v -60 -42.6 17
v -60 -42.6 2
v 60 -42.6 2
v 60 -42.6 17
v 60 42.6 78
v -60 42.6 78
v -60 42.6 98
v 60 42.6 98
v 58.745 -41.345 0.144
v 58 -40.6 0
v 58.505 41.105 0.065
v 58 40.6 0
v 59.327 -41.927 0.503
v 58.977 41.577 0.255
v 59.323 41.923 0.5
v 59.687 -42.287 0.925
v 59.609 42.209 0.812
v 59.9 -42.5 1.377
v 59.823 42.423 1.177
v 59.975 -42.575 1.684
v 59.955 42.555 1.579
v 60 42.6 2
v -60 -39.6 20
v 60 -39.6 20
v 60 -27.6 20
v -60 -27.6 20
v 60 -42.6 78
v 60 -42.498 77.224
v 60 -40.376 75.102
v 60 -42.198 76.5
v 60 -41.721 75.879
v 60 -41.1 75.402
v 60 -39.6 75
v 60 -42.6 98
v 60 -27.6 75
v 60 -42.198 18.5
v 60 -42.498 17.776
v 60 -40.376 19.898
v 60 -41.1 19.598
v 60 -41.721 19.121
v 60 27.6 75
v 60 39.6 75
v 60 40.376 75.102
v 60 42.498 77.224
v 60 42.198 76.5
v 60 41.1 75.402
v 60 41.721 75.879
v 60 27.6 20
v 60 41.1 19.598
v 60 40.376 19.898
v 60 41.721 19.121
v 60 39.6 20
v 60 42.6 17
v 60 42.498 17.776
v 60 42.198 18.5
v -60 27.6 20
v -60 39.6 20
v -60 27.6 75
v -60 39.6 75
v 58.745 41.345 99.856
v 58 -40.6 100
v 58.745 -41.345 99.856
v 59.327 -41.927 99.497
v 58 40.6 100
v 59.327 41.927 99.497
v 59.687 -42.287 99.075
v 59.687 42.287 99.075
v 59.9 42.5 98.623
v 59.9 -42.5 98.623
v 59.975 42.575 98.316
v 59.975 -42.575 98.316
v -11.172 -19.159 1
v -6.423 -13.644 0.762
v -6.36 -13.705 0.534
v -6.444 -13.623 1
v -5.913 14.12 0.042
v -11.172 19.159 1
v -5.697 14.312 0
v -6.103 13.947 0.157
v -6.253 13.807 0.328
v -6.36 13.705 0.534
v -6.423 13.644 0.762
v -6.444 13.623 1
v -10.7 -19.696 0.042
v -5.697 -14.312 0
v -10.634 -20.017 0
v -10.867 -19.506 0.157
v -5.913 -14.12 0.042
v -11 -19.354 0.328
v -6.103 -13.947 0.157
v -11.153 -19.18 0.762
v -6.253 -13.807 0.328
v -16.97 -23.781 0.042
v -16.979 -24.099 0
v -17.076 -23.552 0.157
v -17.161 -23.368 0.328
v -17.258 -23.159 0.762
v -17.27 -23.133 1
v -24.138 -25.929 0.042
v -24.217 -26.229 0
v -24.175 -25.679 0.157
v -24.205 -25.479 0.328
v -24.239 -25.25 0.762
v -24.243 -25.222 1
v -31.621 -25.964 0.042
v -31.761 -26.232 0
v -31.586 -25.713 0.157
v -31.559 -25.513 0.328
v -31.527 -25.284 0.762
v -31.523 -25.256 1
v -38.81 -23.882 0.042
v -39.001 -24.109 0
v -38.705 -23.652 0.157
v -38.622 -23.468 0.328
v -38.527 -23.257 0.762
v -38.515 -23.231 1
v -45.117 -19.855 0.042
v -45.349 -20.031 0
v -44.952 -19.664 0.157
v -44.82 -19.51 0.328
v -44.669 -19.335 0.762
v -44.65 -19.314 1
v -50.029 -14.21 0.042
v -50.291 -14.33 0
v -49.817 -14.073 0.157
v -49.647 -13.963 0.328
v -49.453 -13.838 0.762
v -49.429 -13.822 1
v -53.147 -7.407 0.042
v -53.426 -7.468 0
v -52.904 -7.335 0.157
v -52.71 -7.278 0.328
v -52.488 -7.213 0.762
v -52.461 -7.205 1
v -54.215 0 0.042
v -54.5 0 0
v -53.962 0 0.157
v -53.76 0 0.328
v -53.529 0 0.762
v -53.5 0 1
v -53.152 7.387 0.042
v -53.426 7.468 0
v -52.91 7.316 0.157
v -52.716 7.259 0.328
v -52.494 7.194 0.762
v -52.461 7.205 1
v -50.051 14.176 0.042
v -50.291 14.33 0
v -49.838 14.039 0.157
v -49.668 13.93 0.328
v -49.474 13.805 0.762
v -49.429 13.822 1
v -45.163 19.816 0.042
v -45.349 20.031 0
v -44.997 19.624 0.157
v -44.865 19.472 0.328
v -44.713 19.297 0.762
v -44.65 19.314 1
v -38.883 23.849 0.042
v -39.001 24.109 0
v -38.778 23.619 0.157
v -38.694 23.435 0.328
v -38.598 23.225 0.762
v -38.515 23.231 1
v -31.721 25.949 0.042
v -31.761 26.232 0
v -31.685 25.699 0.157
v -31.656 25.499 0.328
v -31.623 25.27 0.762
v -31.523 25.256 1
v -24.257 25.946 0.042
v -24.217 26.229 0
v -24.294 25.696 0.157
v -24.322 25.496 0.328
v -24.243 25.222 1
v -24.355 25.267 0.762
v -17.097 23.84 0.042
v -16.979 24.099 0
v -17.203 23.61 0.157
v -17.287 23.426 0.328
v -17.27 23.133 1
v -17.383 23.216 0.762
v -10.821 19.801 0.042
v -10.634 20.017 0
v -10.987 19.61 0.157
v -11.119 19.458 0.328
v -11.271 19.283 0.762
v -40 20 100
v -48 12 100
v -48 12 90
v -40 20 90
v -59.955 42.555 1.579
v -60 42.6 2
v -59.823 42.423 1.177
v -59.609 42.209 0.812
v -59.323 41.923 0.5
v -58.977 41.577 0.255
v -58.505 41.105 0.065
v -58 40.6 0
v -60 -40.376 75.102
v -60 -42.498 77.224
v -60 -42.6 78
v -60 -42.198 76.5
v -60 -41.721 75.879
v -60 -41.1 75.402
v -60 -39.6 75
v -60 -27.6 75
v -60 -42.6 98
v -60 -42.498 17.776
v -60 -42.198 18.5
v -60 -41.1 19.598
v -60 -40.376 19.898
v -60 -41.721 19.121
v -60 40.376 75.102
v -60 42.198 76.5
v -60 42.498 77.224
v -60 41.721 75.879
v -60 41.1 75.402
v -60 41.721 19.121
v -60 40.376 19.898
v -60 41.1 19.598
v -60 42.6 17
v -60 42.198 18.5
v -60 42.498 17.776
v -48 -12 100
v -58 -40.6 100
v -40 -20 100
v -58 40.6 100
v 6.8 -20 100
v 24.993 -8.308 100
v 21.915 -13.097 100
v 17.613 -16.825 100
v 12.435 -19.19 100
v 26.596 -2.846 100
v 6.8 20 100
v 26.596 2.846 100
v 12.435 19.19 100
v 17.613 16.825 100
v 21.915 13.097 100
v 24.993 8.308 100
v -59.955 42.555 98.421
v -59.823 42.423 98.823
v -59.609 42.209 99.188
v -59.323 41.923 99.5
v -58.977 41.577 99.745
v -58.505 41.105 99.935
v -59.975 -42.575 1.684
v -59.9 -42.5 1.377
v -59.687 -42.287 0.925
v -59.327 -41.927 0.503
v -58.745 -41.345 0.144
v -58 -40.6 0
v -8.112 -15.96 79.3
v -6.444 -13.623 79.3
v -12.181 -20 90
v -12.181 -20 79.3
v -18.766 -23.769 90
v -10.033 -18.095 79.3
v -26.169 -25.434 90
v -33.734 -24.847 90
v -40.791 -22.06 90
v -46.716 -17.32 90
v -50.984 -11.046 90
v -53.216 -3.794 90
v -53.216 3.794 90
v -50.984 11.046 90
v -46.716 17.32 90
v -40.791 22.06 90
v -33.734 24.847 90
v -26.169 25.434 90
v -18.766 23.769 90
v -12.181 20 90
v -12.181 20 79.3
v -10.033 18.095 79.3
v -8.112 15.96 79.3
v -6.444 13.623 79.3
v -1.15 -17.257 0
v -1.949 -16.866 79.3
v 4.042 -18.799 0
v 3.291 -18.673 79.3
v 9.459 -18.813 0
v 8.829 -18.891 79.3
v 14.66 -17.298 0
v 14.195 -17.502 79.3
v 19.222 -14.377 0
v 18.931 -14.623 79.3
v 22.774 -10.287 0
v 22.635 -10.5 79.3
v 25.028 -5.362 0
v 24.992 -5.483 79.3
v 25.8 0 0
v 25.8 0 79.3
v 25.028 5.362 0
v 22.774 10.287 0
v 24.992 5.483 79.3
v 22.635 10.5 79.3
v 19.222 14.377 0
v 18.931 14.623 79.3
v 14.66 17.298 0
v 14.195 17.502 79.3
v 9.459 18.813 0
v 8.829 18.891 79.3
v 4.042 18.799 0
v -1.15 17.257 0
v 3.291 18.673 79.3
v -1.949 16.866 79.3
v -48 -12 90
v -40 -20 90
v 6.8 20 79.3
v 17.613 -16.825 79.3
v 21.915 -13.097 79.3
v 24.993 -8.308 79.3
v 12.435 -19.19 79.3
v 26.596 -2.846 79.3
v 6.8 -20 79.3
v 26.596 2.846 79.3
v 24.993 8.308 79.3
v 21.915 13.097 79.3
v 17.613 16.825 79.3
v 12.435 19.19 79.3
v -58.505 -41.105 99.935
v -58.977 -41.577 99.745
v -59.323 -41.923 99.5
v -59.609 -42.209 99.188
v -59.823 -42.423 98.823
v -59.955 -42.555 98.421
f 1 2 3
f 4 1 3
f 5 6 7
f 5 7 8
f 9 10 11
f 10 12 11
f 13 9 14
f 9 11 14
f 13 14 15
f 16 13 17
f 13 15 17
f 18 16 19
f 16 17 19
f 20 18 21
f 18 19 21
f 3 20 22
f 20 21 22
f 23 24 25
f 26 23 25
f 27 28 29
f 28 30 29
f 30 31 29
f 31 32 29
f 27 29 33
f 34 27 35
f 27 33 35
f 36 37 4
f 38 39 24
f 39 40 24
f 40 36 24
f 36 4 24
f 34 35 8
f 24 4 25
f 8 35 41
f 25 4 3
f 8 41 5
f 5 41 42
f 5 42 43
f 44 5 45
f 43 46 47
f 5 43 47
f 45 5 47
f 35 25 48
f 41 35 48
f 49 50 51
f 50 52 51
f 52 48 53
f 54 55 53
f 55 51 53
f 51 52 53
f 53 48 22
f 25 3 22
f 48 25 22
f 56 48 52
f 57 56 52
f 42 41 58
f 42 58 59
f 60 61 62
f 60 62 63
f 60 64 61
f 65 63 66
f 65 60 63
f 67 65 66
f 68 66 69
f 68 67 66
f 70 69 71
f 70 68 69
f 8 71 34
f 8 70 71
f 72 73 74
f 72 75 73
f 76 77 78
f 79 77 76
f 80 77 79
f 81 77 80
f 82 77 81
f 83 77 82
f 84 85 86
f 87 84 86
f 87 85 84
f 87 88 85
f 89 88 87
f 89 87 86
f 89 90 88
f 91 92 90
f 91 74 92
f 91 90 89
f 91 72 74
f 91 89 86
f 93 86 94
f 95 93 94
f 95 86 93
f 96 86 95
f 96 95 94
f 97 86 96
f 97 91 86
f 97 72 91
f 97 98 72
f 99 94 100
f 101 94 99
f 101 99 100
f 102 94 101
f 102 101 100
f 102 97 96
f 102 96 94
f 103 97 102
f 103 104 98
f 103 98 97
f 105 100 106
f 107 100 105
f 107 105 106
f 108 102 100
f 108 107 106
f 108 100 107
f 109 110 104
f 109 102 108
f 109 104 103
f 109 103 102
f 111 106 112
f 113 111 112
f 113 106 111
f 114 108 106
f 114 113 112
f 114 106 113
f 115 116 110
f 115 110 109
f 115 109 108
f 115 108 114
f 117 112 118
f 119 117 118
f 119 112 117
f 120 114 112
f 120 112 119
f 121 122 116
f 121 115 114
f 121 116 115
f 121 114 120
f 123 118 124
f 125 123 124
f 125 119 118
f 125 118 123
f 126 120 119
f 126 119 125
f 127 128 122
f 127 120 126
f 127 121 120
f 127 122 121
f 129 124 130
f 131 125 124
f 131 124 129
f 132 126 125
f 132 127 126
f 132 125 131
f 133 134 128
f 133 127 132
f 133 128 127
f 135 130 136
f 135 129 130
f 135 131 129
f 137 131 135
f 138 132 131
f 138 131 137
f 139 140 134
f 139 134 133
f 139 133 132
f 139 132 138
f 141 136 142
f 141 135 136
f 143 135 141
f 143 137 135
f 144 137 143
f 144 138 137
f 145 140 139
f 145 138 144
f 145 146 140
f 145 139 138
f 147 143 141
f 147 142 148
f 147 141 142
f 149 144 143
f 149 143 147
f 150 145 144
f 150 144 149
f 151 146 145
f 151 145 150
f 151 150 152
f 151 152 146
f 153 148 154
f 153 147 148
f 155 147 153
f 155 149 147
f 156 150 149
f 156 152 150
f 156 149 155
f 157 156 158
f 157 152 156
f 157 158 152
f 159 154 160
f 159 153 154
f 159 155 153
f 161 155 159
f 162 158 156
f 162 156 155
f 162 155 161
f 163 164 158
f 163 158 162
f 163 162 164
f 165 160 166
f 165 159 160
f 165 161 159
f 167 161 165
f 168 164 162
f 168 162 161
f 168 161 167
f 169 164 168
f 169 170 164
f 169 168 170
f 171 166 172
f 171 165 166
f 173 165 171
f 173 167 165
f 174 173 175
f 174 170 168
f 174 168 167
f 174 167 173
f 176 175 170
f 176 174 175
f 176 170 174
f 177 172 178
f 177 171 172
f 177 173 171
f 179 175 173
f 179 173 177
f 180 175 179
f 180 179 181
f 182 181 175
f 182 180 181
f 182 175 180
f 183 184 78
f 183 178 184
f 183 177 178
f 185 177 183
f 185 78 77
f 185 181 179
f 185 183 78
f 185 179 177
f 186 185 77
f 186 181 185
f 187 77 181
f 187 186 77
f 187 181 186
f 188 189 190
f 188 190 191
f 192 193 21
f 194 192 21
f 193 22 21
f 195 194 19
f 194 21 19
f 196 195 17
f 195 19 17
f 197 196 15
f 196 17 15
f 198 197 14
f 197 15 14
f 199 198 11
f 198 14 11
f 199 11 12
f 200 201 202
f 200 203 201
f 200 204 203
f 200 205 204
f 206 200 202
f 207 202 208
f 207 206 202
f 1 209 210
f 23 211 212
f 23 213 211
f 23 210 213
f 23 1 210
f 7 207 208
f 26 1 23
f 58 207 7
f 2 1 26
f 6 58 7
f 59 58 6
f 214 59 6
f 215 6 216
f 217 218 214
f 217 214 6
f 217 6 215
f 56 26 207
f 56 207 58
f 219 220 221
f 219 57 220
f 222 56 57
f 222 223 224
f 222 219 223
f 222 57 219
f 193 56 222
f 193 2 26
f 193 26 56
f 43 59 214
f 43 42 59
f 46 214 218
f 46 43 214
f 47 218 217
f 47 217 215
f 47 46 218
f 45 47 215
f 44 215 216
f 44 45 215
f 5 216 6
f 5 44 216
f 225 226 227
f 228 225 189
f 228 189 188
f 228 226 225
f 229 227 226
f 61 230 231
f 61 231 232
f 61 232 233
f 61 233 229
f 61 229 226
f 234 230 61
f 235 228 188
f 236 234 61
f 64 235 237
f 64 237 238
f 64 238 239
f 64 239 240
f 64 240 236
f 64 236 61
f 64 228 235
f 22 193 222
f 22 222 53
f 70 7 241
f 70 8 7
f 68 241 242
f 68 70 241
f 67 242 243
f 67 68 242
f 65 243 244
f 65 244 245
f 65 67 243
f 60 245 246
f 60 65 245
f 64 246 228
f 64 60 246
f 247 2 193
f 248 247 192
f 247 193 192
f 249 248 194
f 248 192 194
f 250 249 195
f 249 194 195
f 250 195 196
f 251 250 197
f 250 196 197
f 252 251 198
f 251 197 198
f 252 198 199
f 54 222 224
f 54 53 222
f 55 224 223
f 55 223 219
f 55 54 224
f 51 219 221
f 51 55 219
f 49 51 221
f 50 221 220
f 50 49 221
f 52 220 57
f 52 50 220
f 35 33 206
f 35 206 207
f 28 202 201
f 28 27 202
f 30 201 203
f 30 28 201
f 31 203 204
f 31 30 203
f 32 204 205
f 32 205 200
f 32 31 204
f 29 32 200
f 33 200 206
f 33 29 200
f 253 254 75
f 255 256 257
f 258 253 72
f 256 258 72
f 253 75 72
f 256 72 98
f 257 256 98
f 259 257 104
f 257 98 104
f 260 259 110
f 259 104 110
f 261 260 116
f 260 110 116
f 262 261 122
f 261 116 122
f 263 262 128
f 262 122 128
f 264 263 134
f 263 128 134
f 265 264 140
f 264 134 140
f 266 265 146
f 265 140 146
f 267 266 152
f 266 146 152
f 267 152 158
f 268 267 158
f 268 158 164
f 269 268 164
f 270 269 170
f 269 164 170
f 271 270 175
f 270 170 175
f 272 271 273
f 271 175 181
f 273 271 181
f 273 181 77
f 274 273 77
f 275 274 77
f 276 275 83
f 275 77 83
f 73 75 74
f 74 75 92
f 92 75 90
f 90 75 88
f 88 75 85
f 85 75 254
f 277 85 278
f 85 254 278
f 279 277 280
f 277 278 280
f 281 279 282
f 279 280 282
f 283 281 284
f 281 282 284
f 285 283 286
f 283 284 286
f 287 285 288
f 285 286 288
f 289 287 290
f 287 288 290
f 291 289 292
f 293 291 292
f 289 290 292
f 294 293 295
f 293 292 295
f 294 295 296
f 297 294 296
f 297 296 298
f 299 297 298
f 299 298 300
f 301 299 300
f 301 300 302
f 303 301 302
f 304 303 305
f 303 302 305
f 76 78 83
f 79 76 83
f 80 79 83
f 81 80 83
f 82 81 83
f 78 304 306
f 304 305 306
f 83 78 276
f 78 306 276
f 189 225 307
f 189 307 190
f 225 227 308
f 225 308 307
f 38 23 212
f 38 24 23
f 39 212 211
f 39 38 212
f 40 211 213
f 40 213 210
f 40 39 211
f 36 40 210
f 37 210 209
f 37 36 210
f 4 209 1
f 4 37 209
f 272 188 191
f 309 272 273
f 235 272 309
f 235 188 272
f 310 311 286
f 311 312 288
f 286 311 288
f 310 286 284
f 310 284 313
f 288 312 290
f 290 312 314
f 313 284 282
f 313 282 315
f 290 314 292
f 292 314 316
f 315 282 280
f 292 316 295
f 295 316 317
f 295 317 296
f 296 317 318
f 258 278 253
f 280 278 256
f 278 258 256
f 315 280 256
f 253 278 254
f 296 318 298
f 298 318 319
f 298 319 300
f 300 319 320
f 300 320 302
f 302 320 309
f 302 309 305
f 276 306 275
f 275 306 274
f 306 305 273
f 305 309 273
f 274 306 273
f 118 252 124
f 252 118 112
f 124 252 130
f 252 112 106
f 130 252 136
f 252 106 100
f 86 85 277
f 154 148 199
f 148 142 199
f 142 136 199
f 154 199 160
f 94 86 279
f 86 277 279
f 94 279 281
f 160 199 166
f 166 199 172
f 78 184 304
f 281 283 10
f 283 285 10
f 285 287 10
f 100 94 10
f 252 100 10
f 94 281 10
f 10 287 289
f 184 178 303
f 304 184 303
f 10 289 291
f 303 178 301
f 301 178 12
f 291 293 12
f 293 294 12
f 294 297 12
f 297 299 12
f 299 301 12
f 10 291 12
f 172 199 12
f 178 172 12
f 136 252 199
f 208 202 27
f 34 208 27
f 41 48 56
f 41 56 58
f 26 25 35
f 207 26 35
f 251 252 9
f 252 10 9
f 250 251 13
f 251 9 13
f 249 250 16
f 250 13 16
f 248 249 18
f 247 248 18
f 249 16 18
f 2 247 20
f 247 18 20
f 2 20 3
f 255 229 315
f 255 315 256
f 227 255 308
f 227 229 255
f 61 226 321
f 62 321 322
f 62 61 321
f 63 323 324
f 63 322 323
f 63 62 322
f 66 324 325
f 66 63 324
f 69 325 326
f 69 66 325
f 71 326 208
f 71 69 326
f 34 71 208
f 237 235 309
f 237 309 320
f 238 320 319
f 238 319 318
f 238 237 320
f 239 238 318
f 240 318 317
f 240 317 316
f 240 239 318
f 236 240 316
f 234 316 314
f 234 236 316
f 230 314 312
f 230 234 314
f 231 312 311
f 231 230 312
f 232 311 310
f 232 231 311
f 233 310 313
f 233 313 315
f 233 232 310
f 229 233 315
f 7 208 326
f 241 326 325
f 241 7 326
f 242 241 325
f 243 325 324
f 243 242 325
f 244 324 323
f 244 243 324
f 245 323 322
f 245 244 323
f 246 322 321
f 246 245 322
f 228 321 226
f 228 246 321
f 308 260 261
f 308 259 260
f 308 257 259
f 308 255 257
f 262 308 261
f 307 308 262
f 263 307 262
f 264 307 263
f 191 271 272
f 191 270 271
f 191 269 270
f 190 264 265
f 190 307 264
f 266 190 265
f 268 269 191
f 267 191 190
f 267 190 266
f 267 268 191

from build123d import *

# Parameters (mm, degrees)
ESQUISSE1_W             = 120
ESQUISSE1_H             = 85.2
BOSS_EXTRU_1_DEPTH      = 100
ESQUISSE2_W             = 55
ESQUISSE2_H             = 15
ENL_V_MAT_EXTRU_1_DEPTH = 121
CONG_1_R                = 3
CONG_2_R                = 2
CONG_3_R                = 2
ESQUISSE3_R             = 25.5
ENL_V_MAT_EXTRU_2_DEPTH = 90
CONG_4_R                = 1
ENL_V_MAT_EXTRU_3_DEPTH = 20.7
ESQUISSE6_R             = 19
ENL_V_MAT_EXTRU_5_DEPTH = 85


with BuildPart() as part:
    # Esquisse1 → Boss.-Extru.1 (new body)
    with BuildSketch(Plane.XY):
        Rectangle(ESQUISSE1_W, ESQUISSE1_H)
    extrude(amount=BOSS_EXTRU_1_DEPTH)

    # Esquisse2 → Enlèv. mat.-Extru.1 (cut, through all)
    with BuildSketch(Plane.ZY.offset(60)):
        with Locations((47.5, 35.1)):
            Rectangle(ESQUISSE2_W, ESQUISSE2_H)
        with Locations((47.5, -35.1)):
            Rectangle(ESQUISSE2_W, ESQUISSE2_H)
    extrude(amount=-ENL_V_MAT_EXTRU_1_DEPTH, mode=Mode.SUBTRACT)

    # Congé1
    cong_1_edges = [part.edges().sort_by_distance(p)[0] for p in [
        (0, 42.6, 75),
        (0, 42.6, 20),
        (0, -42.6, 20),
        (0, -42.6, 75),
    ]]
    fillet(cong_1_edges, radius=CONG_1_R)

    # Congé2
    cong_2_edges = [part.edges().sort_by_distance(p)[0] for p in [
        (0, -42.6, 0),
        (-60, 0, 0),
        (0, 42.6, 0),
        (60, 0, 0),
    ]]
    fillet(cong_2_edges, radius=CONG_2_R)

    # Congé3
    cong_3_edges = [part.edges().sort_by_distance(p)[0] for p in [
        (-60, 0, 100),
        (0, -42.6, 100),
        (60, 0, 100),
        (0, 42.6, 100),
    ]]
    fillet(cong_3_edges, radius=CONG_3_R)

    # Esquisse3 → Enlèv. mat.-Extru.2 (cut)
    with BuildSketch(Plane(origin=(0, 0, 0), x_dir=(-1, 0, 0), z_dir=(0, 0, -1))):
        with Locations((28, 0)):
            Circle(ESQUISSE3_R)
    extrude(amount=-ENL_V_MAT_EXTRU_2_DEPTH, mode=Mode.SUBTRACT)

    # Congé4
    cong_4_edges = [part.edges().sort_by_distance(p)[0] for p in [
        (-2.5, 0, 0),
    ]]
    fillet(cong_4_edges, radius=CONG_4_R)

    # Esquisse5 → Enlèv. mat.-Extru.3 (cut)
    with BuildSketch(Plane.XY.offset(100)):
        with BuildLine():
            Line((-48, 0), (-48, 12))
            Line((-48, 12), (-40, 20))
            Line((-40, 20), (-28, 20))
            Line((-28, 20), (6.8, 20))
            ThreePointArc((6.8, 20), (26.8, 0), (6.8, -20))
            Line((6.8, -20), (-28, -20))
            Line((-28, -20), (-40, -20))
            Line((-40, -20), (-48, -12))
            Line((-48, -12), (-48, 0))
        make_face()
    extrude(amount=-ENL_V_MAT_EXTRU_3_DEPTH, mode=Mode.SUBTRACT)

    # Esquisse6 → Enlèv. mat.-Extru.5 (cut)
    with BuildSketch(Plane.XY.offset(79.3)):
        with Locations((6.8, 0)):
            Circle(ESQUISSE6_R)
    extrude(amount=-ENL_V_MAT_EXTRU_5_DEPTH, mode=Mode.SUBTRACT)


solid = part.part
